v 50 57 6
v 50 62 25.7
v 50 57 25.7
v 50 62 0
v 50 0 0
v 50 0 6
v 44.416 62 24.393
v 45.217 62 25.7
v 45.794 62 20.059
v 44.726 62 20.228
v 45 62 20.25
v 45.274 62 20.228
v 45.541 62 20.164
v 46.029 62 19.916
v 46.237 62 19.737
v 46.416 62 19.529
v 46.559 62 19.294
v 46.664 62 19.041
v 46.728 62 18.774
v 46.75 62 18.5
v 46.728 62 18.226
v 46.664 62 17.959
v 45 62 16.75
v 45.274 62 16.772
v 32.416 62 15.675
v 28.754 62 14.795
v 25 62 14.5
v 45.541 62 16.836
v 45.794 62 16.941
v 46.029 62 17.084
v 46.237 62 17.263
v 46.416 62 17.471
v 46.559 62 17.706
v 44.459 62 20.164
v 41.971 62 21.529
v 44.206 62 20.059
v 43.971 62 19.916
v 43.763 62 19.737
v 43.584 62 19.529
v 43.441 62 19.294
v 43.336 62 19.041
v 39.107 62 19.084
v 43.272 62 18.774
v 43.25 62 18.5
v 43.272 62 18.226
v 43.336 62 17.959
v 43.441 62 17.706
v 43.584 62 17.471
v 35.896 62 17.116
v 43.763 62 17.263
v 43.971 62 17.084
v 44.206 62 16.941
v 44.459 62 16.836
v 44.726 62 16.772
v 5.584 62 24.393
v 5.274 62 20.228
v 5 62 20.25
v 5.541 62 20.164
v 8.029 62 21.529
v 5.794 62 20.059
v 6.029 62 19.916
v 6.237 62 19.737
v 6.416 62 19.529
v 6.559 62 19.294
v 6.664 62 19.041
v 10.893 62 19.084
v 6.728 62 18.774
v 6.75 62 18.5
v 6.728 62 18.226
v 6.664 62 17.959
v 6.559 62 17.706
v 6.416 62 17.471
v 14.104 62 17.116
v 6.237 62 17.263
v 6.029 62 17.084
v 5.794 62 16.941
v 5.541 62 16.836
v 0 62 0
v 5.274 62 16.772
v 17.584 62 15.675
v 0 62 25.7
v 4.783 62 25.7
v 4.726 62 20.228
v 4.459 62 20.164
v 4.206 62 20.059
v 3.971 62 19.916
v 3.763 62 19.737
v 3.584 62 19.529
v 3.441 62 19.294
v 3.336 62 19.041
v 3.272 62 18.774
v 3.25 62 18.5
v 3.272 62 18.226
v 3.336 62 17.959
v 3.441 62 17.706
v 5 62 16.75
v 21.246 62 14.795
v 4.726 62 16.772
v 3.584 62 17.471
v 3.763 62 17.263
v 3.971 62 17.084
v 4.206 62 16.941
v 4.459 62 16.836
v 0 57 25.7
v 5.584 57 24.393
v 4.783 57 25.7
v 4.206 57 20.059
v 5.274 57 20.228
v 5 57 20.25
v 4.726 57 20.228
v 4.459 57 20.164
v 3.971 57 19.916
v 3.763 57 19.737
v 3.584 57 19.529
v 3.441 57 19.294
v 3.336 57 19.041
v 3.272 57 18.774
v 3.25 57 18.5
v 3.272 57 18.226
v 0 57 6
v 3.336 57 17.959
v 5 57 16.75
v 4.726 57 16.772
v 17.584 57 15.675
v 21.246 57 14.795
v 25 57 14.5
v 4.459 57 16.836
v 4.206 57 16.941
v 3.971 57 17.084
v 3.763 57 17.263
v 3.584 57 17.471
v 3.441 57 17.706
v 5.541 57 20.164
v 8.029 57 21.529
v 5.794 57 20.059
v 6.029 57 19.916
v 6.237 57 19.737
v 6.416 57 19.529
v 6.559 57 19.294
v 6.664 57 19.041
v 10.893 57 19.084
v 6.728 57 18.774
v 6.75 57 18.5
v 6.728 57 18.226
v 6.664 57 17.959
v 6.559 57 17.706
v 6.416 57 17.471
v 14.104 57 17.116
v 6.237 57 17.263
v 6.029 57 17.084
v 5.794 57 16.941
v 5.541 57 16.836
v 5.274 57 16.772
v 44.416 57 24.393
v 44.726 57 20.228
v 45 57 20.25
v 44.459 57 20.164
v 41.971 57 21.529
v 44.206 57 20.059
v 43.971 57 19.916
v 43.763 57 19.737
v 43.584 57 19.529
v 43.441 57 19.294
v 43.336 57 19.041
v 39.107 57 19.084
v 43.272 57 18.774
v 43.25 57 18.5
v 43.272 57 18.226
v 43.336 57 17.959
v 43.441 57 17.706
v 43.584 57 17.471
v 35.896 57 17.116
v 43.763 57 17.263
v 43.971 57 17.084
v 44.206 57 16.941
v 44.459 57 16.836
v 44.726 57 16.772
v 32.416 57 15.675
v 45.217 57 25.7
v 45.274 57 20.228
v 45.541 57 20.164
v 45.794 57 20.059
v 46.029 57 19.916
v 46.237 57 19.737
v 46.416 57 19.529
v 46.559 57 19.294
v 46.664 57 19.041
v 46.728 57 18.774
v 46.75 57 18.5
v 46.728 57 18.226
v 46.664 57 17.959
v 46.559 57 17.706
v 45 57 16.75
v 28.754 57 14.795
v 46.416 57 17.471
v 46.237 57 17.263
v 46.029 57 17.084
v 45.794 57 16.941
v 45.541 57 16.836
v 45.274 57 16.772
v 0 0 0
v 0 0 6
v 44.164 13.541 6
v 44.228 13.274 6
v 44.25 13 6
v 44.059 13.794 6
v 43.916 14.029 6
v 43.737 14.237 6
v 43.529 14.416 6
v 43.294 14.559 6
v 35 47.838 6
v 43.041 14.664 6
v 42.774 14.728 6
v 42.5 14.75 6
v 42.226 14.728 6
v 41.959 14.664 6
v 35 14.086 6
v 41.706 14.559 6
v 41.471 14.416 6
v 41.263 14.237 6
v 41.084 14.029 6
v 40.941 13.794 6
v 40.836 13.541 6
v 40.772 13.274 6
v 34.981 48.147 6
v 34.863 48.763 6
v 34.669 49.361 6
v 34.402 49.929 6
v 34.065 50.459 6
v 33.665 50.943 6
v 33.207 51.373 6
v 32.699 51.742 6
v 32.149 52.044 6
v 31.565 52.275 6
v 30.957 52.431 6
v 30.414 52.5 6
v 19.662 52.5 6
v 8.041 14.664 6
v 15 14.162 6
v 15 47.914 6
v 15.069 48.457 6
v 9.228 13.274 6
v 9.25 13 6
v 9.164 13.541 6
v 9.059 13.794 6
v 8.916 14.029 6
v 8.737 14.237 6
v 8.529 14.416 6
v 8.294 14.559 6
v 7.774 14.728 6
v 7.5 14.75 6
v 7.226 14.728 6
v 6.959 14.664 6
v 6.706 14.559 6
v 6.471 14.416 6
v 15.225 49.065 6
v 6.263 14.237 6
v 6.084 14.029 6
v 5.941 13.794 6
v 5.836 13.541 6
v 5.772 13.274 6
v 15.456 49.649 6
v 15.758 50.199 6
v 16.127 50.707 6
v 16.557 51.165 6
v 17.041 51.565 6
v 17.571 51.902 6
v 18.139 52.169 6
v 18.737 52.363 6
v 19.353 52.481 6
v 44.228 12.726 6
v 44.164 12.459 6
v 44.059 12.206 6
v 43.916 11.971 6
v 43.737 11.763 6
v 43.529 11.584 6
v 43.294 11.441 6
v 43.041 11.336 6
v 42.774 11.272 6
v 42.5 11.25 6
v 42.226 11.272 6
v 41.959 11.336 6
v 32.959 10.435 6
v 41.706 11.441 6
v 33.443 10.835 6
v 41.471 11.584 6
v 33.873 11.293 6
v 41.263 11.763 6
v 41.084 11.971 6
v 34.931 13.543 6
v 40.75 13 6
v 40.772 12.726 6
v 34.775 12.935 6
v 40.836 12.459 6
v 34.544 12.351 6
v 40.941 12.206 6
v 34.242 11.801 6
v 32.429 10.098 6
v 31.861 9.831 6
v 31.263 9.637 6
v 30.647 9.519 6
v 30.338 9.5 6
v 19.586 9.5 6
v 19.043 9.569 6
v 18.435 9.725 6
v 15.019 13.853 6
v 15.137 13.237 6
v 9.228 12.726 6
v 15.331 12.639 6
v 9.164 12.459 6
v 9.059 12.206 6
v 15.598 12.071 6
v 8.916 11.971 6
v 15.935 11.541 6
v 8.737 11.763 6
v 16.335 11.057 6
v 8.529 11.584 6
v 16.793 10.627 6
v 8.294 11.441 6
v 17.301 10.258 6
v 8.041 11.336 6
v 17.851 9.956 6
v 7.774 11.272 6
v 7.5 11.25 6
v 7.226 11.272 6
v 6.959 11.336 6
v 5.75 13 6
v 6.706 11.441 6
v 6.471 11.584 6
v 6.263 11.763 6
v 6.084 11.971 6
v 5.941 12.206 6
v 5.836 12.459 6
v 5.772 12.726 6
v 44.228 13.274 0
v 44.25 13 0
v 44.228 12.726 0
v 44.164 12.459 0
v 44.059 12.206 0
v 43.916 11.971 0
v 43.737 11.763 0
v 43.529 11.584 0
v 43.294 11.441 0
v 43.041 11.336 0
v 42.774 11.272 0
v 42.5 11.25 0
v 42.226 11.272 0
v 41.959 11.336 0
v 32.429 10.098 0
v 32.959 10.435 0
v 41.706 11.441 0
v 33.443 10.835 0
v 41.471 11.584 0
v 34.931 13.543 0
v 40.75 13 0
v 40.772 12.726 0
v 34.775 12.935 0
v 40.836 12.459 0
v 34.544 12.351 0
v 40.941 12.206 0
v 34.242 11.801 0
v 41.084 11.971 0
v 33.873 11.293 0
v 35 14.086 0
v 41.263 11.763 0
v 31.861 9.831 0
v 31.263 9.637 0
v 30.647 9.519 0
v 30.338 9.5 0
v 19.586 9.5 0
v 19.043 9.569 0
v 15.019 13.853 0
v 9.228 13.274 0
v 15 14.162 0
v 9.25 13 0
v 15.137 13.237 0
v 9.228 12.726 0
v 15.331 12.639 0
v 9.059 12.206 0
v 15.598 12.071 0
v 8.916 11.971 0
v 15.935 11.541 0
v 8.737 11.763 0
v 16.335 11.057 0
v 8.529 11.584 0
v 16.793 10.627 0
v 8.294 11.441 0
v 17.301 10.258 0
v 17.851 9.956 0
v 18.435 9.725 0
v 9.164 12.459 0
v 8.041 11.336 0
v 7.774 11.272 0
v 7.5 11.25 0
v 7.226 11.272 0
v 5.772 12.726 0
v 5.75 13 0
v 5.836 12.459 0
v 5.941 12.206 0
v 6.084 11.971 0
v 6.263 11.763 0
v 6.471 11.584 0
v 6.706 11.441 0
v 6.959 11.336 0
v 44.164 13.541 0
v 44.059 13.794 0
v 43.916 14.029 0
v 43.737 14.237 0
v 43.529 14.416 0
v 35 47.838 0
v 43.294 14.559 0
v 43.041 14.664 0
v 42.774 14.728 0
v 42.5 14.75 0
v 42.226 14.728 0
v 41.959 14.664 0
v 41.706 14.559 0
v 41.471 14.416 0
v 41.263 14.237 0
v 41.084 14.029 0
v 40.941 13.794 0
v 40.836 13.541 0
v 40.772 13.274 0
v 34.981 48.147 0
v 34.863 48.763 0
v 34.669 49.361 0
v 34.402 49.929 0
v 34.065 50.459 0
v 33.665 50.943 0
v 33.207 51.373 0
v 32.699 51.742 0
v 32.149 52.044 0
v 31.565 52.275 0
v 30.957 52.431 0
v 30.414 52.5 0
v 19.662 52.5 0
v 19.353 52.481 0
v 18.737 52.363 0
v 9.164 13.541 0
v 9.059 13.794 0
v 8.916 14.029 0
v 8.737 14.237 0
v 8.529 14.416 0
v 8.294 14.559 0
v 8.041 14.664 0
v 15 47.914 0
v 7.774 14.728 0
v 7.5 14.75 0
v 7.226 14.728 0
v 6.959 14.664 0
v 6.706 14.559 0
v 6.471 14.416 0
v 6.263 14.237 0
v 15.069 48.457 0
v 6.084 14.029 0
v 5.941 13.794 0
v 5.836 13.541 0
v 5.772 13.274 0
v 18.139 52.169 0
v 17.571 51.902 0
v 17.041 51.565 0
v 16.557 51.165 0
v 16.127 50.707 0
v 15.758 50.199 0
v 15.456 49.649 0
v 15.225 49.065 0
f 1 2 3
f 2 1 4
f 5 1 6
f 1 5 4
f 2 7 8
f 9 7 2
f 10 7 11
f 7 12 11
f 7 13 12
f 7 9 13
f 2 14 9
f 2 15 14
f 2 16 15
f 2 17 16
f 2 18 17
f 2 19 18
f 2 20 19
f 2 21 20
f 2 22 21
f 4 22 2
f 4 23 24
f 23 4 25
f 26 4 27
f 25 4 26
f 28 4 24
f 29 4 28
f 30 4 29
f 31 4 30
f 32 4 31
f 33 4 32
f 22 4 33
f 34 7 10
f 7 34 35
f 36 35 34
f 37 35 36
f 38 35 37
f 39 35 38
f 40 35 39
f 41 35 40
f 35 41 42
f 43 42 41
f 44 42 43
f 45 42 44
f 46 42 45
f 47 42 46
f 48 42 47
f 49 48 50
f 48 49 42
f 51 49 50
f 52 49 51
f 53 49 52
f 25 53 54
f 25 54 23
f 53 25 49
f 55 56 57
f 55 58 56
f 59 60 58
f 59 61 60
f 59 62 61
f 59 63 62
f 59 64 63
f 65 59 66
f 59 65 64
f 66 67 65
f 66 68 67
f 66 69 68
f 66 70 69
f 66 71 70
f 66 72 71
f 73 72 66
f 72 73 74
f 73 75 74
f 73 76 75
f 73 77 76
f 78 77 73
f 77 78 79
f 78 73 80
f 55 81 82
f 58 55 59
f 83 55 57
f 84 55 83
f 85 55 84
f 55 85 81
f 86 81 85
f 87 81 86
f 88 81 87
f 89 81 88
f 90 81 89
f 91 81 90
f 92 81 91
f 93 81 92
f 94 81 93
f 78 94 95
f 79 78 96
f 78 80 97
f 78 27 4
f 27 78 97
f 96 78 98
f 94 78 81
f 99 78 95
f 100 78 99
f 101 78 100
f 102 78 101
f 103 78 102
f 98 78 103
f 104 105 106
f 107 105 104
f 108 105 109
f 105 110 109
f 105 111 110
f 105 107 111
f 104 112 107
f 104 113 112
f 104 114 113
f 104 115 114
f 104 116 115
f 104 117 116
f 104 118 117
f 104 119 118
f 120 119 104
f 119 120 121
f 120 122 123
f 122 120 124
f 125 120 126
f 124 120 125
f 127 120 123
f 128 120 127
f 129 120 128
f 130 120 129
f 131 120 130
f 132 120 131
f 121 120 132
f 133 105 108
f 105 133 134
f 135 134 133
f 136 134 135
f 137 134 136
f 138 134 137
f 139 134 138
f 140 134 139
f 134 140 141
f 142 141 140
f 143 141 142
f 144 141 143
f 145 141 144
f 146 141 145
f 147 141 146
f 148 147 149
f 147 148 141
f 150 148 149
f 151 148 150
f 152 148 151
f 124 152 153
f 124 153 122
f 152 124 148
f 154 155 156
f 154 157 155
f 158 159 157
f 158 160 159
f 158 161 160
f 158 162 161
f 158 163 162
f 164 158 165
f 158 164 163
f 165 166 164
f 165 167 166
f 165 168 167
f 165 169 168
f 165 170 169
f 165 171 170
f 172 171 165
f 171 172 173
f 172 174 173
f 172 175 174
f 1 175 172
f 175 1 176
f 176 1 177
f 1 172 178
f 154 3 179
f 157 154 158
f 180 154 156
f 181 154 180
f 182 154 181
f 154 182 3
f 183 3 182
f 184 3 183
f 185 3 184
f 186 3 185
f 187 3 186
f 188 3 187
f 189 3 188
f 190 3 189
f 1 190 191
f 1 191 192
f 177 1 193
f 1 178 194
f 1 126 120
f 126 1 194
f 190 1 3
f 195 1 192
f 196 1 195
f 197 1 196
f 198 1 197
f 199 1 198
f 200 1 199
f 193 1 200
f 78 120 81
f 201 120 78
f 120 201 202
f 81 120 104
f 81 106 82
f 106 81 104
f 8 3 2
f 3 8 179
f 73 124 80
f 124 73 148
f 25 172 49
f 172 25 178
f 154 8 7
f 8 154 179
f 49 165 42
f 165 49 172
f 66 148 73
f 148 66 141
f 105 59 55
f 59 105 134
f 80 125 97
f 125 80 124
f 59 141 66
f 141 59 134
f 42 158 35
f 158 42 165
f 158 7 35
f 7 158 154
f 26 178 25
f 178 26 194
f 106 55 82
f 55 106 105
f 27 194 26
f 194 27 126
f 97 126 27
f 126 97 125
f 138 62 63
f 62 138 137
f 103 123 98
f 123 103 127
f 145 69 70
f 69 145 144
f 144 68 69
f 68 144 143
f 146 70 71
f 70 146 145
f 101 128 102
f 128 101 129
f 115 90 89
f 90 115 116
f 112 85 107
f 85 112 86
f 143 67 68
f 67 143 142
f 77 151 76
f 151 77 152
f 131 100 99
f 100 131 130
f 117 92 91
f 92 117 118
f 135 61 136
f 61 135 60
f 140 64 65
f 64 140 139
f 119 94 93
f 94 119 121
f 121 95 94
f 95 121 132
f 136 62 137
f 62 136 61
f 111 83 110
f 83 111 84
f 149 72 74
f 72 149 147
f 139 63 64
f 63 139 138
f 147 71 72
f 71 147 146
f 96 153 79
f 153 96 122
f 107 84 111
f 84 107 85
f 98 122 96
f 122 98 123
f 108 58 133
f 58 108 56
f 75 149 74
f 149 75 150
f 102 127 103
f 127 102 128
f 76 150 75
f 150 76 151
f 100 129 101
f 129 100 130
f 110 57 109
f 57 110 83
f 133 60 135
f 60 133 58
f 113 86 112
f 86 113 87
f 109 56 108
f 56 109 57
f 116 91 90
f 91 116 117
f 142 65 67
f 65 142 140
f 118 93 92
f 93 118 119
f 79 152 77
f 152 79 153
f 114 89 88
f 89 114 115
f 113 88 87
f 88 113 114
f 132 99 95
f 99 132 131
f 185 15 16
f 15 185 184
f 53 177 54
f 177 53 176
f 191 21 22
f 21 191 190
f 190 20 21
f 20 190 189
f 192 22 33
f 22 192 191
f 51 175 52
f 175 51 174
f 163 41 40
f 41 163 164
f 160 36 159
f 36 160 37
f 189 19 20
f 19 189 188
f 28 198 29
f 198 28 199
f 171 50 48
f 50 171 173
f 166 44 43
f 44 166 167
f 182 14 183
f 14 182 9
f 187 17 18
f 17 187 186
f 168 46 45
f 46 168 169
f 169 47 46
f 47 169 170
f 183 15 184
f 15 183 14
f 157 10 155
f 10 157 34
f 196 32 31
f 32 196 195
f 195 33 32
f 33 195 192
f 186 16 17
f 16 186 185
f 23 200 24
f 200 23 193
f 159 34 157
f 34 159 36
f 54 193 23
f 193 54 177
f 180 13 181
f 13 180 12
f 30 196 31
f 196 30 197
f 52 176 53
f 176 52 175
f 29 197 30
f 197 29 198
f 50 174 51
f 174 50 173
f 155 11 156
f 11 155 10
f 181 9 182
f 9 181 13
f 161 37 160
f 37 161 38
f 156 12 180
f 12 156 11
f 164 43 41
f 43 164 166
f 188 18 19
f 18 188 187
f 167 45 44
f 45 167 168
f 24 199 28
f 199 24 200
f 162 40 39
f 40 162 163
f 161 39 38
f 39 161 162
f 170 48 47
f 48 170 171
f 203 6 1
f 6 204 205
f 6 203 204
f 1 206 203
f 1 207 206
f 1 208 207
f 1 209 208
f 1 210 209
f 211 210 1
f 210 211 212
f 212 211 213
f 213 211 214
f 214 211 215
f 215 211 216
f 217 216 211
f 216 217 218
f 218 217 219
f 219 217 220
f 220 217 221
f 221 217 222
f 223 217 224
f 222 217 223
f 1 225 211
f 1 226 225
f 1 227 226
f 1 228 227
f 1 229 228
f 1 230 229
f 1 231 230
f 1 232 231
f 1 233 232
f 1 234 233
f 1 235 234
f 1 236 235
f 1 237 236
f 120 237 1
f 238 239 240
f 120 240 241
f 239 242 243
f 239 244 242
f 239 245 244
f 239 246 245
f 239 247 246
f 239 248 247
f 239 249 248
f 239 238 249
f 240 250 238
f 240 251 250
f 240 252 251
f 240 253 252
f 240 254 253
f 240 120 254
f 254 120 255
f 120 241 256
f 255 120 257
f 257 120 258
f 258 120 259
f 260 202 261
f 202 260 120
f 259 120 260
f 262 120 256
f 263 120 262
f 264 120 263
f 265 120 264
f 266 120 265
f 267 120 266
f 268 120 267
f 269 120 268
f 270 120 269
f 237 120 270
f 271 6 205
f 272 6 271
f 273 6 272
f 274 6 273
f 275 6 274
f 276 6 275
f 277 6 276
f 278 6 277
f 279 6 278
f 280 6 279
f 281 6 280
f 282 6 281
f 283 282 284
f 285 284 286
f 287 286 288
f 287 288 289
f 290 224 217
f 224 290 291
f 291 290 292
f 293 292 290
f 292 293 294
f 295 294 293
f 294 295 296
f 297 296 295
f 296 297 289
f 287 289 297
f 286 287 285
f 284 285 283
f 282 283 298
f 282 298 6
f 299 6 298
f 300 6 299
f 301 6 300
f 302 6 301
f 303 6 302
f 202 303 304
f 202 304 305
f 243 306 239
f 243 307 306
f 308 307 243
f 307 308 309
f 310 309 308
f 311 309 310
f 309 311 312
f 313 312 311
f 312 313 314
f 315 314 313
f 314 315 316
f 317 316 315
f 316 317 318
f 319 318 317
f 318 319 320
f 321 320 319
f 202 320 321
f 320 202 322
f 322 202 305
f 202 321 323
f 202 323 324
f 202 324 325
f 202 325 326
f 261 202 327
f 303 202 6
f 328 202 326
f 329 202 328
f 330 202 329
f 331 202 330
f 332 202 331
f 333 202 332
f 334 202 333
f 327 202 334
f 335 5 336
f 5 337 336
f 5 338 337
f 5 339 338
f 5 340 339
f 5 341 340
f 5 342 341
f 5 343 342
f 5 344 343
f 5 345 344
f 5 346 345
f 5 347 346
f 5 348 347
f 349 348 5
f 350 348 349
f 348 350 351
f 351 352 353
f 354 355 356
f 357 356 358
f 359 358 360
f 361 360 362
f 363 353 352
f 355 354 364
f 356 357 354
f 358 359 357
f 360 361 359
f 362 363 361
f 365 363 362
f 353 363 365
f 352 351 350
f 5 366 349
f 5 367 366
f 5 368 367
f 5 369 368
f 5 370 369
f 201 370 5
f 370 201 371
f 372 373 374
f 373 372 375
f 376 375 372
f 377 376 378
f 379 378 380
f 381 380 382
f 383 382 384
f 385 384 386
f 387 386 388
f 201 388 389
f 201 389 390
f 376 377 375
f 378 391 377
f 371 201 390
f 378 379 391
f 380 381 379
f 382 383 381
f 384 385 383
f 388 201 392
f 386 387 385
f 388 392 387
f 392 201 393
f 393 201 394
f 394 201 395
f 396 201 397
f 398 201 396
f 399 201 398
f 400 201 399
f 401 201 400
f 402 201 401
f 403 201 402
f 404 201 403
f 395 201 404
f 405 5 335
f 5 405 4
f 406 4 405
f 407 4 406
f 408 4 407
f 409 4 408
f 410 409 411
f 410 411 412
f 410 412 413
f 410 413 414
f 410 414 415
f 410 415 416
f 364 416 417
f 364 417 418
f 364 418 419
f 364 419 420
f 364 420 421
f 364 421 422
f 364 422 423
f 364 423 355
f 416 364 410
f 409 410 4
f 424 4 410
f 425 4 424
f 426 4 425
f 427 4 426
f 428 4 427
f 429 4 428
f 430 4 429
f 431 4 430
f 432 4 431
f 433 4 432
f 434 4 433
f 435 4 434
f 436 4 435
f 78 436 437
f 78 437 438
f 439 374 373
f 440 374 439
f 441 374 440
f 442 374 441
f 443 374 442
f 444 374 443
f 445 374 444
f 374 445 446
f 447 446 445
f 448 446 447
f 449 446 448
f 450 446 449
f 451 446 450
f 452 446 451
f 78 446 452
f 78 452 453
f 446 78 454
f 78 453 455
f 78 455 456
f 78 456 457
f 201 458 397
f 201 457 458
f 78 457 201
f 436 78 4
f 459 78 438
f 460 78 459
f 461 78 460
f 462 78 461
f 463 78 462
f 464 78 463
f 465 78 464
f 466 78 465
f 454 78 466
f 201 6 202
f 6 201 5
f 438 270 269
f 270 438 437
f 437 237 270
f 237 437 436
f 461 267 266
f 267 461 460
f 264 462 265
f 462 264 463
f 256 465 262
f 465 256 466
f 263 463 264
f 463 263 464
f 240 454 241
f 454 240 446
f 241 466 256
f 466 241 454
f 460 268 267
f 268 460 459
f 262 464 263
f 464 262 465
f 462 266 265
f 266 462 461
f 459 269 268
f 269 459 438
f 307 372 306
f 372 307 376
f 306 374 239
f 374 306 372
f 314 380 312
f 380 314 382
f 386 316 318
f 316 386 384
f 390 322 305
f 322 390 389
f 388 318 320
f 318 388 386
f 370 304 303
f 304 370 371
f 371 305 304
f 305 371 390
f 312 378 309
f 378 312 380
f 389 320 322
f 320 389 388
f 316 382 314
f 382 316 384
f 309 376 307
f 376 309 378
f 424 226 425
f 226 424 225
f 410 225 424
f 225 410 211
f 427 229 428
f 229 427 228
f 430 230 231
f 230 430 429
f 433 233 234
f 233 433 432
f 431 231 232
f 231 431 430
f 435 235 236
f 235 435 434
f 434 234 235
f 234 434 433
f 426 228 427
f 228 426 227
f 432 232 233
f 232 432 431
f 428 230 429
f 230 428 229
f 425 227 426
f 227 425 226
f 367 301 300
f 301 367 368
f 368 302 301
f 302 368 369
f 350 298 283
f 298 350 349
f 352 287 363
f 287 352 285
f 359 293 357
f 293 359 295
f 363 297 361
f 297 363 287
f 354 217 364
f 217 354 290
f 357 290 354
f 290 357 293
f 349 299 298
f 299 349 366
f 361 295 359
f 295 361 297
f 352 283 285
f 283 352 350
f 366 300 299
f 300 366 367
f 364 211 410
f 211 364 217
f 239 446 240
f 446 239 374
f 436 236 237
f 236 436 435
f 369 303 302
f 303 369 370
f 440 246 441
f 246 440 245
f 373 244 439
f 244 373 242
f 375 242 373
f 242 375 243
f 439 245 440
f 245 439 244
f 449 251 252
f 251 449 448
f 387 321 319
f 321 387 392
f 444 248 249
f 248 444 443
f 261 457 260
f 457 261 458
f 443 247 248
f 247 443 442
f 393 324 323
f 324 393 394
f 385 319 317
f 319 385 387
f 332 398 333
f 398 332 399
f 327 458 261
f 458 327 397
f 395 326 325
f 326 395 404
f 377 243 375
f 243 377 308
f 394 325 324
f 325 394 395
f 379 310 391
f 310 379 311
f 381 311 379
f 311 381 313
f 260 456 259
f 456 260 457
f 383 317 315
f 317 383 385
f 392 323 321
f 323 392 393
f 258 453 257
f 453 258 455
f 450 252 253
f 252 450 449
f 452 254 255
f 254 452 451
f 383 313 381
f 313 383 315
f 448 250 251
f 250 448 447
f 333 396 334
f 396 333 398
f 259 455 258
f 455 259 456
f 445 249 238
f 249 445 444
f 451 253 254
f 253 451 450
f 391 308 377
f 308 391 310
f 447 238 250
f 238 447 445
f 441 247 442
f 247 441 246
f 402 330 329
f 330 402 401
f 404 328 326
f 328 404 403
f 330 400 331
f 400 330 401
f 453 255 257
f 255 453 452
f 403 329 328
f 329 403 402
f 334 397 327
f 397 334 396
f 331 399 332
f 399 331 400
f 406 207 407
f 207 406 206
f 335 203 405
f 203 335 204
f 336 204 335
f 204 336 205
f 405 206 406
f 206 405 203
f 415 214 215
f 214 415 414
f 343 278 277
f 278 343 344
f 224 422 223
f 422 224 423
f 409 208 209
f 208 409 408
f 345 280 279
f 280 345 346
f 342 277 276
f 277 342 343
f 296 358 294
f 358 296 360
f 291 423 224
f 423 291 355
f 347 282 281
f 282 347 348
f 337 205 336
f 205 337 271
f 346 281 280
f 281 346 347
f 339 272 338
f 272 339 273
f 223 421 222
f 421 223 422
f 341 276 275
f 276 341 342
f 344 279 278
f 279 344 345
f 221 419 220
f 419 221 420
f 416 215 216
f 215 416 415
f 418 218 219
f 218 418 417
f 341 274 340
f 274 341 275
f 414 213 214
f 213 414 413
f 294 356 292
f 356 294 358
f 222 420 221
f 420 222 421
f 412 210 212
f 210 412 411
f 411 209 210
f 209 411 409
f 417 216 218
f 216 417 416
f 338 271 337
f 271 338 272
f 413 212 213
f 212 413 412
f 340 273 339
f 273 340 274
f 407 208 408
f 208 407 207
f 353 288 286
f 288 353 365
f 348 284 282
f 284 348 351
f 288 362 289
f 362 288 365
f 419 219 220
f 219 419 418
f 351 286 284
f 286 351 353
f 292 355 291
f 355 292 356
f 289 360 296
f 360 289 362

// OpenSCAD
// file: pcb-clamp-data.scad
// ========================================================================================
// Robori Mendel
// Shared data for RAMPS stack mounting
// GNU GPL v3
//
// Contact : support@robori.com
// Reference : http://www.robori.com/documentation/Mendel
//
// History :
// 15 Feb 2015 - First version
// ========================================================================================

// Fan holder mount
fan_holder_mount_l = 50;
fan_holder_mount_w = 20;
fan_holder_mount_h = 6;
fan_holder_mount_void_l = 20;
fan_holder_mount_void_from_edge = 4;
fan_holder_mount_screw_d = 3 + 0.5;
fan_holder_mount_screw1_x = 7.5;
fan_holder_mount_screw2_x = 42.5;
fan_holder_mount_screw_y = fan_holder_mount_h + (fan_holder_mount_w - fan_holder_mount_h)/2;
// file: library/library_3d.scad
// ========================================================================================
// Robori Mendel
// General 3D library
// GNU GPL v3
//
// Contact : support@robori.com
// Reference : http://www.robori.com/documentation/Mendel
//
// History :
// 2013 - First version
// ========================================================================================

lib3d_fn = 50;

// TESTING
//lib3d_hex_nut_recess(3);
//lib3d_round_cube(10, 8, 10, 1, true, false, true, false);


// Hexagonal nut recess
module lib3d_hex_nut_recess(size)
{
	length = 0.8*size;
	hex_r = 1.8*size/2;
	cylinder(h=length, r=hex_r, center=false, $fn=6);
}

// Cube with customized rounded corners
module lib3d_round_cube(x, y, z, rad, left_top=true, left_bottom=true, right_top=true, right_bottom=true)
{
	rx = x/2 - rad + 0.02;
	ry = y/2 - rad + 0.02;

	translate([x/2, y/2, 0]) difference()
	{	
		translate([-x/2, -y/2, 0]) cube([x, y, z]);
		if (left_top)
			translate([-rx, ry, -1]) rotate([0, 0, 90]) __lib3d_round_corner(rad, z + 2);
		if (left_bottom)
			translate([-rx, -ry, -1]) rotate([0, 0, 180]) __lib3d_round_corner(rad, z + 2);
		if (right_top)
			translate([rx, ry, -1]) __lib3d_round_corner(rad, z + 2);
		if (right_bottom)
			translate([rx, -ry, -1]) rotate([0, 0, 270]) __lib3d_round_corner(rad, z + 2);
	}
}

// Helper
module __lib3d_round_corner(rad, height)
{
	difference()
	{
		cube([rad, rad, height]);
		cylinder(h=height, r=rad, center=false, $fn=lib3d_fn);
	}
}
// main file
// ========================================================================================
// Robori Mendel
// Cooling fan holder for RAMPS stack
// GNU GPL v3
//
// Contact : support@robori.com
// Reference : http://www.robori.com/documentation/Mendel
//
// History :
// 16 Feb 2015 - First version
// ========================================================================================

include <library/library_3d.scad>
include <pcb-clamp-data.scad>

$fn=40;

// Level : controller stack height = 56mm
level_l = 50;
level_w = 6 + 56;
level_h = 6;

// Fan frame
frame_l = level_l;
frame_w = 25.7;
frame_h = 5;
frame_fan_d = 48;
frame_screw_d = 3 + 0.5;

pcb_fan_holder();

module pcb_fan_holder()
{
	void_w = level_w - fan_holder_mount_h - frame_h - 2*fan_holder_mount_void_from_edge;

	difference()
	{
		union()
		{
			// level
			cube([level_l, level_w, level_h]);
			// frame
			translate([0, level_w - frame_h, frame_w]) rotate([-90, 0, 0]) difference()
			{
				// frame plate
				cube([frame_l, frame_w, frame_h]);
				// fan
				translate([frame_l/2, -12.8, -1]) cylinder(r=frame_fan_d/2, h=frame_h + 2, center=false);
				// fan screw holes
				translate([5, 7.2, -1]) cylinder(r=frame_screw_d/2, h=frame_h + 2, center=false);
				translate([45, 7.2, -1]) cylinder(r=frame_screw_d/2, h=frame_h + 2, center=false);
			}
		}
		// holder mount screw holes
		translate([fan_holder_mount_screw1_x, fan_holder_mount_screw_y, -1]) cylinder(r=fan_holder_mount_screw_d/2, h=level_h + 2, center=false);
		translate([fan_holder_mount_screw2_x, fan_holder_mount_screw_y, -1]) cylinder(r=fan_holder_mount_screw_d/2, h=level_h + 2, center=false);
		// level void
		translate([level_l/2 - fan_holder_mount_void_l/2, level_w/2 - void_w/2, -1]) lib3d_round_cube(fan_holder_mount_void_l, void_w, level_h + 2 ,5, true, true, true, true);
	}
}
